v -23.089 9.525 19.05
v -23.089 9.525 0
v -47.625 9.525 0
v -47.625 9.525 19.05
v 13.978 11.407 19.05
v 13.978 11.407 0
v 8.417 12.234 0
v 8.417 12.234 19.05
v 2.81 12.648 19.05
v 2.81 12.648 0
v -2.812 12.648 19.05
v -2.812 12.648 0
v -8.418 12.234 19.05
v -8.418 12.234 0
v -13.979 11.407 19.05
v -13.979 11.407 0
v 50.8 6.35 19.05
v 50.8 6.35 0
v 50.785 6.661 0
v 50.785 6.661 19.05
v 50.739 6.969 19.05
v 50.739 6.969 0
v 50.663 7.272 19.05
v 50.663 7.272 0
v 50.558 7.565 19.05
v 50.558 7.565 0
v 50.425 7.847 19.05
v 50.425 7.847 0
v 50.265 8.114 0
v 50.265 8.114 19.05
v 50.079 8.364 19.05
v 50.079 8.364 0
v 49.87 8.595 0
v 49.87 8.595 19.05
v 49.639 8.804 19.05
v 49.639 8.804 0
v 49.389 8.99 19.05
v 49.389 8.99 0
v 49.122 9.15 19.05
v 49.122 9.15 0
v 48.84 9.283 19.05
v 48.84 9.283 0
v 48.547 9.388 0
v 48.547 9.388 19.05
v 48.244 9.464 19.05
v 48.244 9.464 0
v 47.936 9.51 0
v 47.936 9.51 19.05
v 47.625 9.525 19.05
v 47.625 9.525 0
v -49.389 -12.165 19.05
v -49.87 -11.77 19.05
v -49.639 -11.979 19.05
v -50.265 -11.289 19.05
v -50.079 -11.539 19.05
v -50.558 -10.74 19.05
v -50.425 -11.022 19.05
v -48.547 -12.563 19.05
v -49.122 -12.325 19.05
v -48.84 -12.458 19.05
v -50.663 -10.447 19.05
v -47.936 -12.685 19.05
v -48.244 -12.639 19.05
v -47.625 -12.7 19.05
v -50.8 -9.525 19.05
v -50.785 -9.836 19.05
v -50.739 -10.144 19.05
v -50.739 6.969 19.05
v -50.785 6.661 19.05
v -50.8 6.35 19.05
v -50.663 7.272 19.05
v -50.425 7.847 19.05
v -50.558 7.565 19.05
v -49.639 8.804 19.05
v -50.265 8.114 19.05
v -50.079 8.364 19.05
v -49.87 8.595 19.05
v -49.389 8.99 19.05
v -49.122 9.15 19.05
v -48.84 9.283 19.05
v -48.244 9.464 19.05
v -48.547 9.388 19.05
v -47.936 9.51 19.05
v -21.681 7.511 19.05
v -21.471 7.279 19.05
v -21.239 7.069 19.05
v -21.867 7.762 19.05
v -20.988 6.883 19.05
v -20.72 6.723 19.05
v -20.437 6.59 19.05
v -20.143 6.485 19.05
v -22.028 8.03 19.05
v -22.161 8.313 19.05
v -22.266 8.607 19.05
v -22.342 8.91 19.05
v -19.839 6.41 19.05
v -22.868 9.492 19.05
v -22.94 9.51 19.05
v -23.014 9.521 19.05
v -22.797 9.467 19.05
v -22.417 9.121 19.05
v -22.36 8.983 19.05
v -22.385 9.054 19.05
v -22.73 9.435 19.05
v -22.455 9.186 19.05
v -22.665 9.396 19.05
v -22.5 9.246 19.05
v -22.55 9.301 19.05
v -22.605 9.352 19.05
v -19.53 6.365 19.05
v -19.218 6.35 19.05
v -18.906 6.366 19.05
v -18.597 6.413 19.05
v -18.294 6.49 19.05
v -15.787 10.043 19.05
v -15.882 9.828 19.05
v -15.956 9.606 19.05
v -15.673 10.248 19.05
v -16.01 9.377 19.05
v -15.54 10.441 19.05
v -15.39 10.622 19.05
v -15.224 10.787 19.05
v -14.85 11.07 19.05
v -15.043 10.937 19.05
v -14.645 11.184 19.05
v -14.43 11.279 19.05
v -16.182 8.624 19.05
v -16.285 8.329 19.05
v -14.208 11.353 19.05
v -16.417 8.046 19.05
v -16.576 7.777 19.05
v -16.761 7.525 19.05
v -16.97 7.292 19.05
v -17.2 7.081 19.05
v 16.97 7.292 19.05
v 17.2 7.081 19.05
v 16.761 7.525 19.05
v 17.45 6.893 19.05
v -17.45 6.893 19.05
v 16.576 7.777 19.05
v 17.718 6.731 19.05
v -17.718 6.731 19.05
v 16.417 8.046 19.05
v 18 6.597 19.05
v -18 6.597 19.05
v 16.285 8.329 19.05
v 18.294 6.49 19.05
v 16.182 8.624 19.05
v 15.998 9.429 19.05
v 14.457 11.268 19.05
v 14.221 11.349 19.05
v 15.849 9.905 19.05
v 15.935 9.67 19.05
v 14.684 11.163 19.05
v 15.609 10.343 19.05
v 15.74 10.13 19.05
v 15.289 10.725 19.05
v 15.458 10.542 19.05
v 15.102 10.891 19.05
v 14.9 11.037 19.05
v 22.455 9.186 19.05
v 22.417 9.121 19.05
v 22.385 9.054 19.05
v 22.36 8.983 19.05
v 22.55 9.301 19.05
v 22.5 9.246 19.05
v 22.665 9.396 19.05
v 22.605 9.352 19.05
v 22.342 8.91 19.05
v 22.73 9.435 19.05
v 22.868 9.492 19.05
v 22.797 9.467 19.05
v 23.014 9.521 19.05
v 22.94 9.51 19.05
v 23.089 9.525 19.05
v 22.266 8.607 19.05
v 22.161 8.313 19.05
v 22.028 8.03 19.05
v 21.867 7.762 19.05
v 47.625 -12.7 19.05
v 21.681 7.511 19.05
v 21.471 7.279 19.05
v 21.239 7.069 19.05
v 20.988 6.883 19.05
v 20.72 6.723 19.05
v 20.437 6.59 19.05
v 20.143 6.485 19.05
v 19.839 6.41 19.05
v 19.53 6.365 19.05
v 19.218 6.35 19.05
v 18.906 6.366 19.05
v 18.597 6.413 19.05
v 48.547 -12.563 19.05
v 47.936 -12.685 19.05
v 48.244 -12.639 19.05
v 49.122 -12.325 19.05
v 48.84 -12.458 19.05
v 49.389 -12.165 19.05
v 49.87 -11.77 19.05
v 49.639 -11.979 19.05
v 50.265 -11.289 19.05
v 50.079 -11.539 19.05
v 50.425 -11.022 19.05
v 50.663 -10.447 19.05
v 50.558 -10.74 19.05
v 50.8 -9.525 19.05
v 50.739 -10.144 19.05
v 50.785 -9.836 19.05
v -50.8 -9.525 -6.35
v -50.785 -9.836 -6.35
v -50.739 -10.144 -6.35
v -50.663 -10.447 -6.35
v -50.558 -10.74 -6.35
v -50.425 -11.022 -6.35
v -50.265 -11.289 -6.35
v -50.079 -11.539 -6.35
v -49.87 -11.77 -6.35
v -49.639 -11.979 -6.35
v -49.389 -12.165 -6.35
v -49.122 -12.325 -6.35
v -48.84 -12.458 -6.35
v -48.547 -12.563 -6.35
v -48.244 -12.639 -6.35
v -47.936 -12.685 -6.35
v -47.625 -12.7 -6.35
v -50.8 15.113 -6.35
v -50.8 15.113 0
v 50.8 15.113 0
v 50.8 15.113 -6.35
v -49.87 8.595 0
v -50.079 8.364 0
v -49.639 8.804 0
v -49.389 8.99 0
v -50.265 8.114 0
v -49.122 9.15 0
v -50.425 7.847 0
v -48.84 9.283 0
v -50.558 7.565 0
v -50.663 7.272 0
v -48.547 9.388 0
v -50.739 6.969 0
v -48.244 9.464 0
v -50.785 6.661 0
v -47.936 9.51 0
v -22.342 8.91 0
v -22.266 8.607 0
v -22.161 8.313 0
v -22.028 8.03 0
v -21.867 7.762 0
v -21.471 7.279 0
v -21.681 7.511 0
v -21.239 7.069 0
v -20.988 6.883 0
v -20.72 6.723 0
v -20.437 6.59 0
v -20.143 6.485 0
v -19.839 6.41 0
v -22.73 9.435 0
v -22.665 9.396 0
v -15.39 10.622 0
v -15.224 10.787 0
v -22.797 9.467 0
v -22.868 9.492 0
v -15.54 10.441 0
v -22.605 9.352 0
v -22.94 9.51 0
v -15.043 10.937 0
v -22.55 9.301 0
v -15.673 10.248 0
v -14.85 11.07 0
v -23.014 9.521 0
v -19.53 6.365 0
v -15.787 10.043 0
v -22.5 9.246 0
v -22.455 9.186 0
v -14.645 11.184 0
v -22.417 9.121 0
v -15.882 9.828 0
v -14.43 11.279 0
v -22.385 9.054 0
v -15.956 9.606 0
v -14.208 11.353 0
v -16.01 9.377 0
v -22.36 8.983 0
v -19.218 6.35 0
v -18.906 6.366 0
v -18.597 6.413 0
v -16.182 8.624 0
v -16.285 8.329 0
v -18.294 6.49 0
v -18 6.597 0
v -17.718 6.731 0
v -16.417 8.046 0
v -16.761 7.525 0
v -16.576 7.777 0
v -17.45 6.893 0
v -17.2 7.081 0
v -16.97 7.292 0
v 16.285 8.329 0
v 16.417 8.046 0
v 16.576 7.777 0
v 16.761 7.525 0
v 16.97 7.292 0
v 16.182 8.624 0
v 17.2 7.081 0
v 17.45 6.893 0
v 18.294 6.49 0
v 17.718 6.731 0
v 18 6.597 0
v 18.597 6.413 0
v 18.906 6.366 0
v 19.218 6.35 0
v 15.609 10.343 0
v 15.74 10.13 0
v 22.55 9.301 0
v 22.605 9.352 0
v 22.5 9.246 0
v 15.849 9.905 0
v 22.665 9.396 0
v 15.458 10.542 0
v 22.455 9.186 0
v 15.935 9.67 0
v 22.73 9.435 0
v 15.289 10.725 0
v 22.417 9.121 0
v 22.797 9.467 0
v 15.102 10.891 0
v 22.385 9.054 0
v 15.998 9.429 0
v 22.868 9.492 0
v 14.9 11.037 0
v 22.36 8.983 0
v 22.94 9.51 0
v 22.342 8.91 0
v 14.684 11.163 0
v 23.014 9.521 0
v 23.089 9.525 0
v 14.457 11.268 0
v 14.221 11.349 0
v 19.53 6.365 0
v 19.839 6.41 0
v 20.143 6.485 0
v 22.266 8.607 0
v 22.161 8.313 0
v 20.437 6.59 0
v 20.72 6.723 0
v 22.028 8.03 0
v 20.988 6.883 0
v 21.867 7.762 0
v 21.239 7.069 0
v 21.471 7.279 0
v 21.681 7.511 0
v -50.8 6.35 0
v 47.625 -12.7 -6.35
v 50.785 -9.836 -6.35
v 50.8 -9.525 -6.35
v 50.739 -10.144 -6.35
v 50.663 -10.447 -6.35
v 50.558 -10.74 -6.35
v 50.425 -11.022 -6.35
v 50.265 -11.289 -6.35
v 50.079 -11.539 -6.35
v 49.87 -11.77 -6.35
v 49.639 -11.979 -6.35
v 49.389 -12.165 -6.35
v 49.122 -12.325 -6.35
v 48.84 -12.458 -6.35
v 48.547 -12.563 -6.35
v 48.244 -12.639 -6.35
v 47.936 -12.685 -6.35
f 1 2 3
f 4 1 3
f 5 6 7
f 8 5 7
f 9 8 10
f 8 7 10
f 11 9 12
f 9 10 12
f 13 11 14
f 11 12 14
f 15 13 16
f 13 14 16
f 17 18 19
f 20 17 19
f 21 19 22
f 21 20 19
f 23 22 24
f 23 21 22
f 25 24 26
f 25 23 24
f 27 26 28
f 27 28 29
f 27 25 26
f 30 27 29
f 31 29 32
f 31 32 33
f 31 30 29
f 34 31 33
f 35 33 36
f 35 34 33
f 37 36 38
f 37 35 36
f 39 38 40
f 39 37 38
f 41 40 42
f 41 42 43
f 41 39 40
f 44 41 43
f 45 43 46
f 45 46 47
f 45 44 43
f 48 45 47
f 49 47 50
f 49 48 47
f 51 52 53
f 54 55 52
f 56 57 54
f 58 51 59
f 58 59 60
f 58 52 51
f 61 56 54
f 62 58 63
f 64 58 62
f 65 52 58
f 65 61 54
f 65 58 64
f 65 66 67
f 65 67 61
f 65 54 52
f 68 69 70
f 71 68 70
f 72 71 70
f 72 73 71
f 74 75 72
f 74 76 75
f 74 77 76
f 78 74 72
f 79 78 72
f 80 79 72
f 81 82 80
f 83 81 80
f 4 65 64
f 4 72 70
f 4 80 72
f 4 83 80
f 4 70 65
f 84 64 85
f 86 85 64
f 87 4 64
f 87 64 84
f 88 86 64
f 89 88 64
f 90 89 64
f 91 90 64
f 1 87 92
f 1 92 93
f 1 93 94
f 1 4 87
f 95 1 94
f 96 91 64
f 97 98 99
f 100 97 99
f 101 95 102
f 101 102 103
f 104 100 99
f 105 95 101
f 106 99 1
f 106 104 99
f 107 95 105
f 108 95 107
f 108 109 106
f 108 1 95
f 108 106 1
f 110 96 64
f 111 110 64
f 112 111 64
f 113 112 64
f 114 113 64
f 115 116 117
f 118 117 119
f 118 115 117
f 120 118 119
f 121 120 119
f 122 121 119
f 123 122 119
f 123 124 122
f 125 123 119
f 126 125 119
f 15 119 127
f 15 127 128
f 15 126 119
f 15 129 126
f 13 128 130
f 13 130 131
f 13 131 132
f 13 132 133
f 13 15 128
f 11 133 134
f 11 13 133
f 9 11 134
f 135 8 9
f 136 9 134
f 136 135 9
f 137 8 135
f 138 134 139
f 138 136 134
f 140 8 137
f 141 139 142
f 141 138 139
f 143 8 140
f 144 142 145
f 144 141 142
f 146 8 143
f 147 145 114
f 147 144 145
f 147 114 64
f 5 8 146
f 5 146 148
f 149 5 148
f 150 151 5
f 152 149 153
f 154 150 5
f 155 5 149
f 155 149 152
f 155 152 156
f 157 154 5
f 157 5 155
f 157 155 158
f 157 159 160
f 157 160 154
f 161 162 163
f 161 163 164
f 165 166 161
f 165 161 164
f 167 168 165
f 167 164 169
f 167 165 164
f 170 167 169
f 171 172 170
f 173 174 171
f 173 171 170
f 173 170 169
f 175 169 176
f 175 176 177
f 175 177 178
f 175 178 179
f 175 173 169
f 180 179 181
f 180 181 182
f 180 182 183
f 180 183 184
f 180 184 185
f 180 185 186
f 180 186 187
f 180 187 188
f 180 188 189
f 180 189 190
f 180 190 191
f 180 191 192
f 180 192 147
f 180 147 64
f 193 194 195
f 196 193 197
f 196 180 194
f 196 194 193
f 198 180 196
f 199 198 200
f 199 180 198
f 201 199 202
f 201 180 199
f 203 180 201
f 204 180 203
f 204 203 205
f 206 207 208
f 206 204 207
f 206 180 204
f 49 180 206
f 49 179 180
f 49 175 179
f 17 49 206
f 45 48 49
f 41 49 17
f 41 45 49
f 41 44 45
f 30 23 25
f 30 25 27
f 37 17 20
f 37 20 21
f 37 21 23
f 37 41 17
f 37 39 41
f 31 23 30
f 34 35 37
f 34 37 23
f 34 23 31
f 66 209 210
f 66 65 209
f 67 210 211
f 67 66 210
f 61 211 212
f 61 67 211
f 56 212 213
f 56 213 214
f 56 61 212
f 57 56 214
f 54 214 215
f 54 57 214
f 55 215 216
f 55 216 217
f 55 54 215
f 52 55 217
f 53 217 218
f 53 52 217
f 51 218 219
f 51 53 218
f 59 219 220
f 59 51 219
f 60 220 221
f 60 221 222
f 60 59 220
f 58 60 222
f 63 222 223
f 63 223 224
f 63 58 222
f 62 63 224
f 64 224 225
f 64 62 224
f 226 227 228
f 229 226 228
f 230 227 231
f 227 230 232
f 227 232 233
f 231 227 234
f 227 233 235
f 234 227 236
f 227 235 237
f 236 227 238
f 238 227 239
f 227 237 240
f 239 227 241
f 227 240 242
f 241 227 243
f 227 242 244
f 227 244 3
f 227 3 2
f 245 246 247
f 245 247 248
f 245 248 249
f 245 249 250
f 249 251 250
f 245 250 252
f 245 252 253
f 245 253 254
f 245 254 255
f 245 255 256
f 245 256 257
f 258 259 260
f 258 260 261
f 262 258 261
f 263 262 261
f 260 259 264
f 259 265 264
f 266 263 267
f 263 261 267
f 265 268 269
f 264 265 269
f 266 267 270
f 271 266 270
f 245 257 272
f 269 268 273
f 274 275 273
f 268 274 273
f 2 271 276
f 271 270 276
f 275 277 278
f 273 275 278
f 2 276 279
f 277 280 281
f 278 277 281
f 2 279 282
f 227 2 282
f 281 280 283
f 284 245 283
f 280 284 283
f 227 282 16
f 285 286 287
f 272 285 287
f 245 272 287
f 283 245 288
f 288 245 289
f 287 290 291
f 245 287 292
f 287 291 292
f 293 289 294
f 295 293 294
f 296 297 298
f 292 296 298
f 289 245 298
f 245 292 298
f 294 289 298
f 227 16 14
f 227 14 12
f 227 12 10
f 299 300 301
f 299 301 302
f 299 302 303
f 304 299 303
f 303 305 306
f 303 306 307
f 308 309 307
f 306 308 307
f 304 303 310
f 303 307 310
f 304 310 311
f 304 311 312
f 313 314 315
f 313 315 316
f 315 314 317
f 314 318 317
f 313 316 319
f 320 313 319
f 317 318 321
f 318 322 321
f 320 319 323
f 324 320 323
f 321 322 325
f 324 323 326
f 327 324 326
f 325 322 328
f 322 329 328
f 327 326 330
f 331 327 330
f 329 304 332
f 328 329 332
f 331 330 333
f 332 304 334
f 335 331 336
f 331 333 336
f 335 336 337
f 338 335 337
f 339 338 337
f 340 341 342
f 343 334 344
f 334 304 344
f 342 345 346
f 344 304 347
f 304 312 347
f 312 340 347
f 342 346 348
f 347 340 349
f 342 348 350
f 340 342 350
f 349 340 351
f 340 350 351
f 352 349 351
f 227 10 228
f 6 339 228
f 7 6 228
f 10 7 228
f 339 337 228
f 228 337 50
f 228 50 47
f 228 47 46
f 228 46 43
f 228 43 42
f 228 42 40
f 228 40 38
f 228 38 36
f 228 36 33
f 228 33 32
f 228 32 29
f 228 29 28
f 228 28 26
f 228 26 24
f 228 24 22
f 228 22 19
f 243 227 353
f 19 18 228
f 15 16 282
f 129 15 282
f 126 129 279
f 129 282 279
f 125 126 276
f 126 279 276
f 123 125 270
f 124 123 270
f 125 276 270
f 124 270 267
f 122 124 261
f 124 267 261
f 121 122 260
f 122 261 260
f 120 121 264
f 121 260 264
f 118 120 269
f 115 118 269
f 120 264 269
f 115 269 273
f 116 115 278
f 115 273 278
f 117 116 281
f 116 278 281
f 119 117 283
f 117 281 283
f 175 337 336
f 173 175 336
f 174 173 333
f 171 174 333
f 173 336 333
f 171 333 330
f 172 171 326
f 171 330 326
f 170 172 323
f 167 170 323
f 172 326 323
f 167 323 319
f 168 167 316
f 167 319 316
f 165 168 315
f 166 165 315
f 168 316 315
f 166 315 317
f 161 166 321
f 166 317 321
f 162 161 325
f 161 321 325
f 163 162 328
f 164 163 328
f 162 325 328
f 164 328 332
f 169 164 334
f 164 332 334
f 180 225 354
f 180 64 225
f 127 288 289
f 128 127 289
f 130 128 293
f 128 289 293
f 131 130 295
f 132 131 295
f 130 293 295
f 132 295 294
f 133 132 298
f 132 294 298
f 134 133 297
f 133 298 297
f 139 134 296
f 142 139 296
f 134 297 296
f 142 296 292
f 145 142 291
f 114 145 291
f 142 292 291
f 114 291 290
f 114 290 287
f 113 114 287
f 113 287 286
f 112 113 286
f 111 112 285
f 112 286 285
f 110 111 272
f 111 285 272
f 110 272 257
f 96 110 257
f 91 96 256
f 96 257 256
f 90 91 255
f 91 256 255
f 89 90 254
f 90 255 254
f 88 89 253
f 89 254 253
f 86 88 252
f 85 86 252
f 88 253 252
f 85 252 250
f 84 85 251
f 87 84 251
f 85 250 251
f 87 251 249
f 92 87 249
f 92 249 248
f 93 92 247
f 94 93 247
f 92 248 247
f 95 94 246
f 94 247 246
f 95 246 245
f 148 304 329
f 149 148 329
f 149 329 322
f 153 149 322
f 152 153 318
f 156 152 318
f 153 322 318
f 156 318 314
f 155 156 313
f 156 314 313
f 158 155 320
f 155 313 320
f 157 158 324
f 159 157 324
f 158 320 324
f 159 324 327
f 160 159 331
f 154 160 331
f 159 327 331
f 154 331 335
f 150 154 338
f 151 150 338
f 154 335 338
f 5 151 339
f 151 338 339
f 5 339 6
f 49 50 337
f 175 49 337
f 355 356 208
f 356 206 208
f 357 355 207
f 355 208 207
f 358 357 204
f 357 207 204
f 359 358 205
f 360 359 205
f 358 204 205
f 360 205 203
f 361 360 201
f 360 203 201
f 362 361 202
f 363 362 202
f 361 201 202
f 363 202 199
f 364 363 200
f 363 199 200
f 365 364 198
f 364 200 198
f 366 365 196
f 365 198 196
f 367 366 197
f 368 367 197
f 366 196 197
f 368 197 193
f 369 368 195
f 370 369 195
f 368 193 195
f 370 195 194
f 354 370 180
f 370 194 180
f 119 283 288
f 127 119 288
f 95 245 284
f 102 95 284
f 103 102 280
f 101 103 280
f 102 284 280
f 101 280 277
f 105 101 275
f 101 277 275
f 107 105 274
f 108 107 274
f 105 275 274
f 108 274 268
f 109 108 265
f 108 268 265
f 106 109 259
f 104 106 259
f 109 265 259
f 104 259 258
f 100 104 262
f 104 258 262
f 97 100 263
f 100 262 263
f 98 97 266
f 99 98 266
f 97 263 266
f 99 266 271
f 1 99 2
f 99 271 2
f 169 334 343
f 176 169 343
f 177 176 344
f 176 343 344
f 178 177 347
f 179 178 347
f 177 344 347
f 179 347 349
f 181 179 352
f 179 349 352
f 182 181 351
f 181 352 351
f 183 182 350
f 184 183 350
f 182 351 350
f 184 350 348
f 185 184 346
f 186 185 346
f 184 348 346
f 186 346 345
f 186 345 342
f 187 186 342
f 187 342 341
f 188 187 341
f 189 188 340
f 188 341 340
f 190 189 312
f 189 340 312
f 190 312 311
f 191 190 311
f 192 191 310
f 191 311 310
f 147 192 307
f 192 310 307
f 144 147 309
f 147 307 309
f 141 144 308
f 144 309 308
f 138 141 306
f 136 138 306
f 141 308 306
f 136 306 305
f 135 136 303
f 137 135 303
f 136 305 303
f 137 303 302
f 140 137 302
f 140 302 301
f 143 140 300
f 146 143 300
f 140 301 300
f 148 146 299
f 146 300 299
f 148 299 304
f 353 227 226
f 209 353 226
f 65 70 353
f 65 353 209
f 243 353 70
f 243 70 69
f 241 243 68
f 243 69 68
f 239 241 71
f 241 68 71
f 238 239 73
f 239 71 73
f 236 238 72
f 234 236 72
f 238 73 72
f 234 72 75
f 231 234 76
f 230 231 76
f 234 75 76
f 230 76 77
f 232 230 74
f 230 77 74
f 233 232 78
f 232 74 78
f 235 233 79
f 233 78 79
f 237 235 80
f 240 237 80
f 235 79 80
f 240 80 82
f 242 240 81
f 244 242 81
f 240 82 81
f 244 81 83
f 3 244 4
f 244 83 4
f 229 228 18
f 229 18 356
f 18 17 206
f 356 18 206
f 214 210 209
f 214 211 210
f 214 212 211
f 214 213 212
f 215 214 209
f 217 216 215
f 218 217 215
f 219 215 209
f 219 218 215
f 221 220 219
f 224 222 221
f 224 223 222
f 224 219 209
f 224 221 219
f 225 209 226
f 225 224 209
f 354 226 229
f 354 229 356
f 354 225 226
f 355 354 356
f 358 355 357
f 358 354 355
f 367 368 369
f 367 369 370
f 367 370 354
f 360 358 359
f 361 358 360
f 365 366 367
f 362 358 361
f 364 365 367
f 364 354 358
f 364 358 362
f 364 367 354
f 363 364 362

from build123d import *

# Parameters (mm, degrees)
F1_DEPTH = 19.05
F2_W     = 101.6
F2_H     = 27.813
F3_DEPTH = 6.35
F4_R     = 3.175


with BuildPart() as f1:
    # F0 (on Top) → F1 (new body)
    with BuildSketch(Plane.XY):
        with BuildLine():
            Line((-50.8, -12.7), (50.8, -12.7))
            Line((50.8, -12.7), (50.8, 9.525))
            Line((50.8, 9.525), (23.089258, 9.525))
            ThreePointArc((23.089258, 9.525), (22.605387, 9.351654), (22.341666, 8.910484))
            ThreePointArc((22.341666, 8.910484), (19.37408, 6.353422), (16.182151, 8.624264))
            Line((16.182151, 8.624264), (15.998242, 9.428533))
            ThreePointArc((15.998242, 9.428533), (15.288748, 10.725007), (13.977624, 11.407049))
            ThreePointArc((13.977624, 11.407049), (-0.000865, 12.7), (-13.979325, 11.406732))
            ThreePointArc((-13.979325, 11.406732), (-15.308897, 10.706393), (-16.009978, 9.377212))
            Line((-16.009978, 9.377212), (-16.182151, 8.624264))
            ThreePointArc((-16.182151, 8.624264), (-19.37408, 6.353422), (-22.341666, 8.910484))
            ThreePointArc((-22.341666, 8.910484), (-22.605387, 9.351654), (-23.089258, 9.525))
            Line((-23.089258, 9.525), (-50.8, 9.525))
            Line((-50.8, 9.525), (-50.8, -12.7))
        make_face()
    extrude(amount=F1_DEPTH)

    # F2 (on face) → F3 (join)
    with BuildSketch(Plane(origin=(0, 0, 0), x_dir=(1, 0, 0), z_dir=(0, 0, -1))):
        with Locations((0, -1.2065)):
            Rectangle(F2_W, F2_H)
    extrude(amount=F3_DEPTH)

    # F4
    f4_edges = [f1.edges().sort_by_distance(p)[0] for p in [
        (50.8, 9.525, 9.525),
        (-50.8, 9.525, 9.525),
        (-50.8, -12.7, 6.35),
        (50.8, -12.7, 6.35),
    ]]
    fillet(f4_edges, radius=F4_R)


solid = f1.part
